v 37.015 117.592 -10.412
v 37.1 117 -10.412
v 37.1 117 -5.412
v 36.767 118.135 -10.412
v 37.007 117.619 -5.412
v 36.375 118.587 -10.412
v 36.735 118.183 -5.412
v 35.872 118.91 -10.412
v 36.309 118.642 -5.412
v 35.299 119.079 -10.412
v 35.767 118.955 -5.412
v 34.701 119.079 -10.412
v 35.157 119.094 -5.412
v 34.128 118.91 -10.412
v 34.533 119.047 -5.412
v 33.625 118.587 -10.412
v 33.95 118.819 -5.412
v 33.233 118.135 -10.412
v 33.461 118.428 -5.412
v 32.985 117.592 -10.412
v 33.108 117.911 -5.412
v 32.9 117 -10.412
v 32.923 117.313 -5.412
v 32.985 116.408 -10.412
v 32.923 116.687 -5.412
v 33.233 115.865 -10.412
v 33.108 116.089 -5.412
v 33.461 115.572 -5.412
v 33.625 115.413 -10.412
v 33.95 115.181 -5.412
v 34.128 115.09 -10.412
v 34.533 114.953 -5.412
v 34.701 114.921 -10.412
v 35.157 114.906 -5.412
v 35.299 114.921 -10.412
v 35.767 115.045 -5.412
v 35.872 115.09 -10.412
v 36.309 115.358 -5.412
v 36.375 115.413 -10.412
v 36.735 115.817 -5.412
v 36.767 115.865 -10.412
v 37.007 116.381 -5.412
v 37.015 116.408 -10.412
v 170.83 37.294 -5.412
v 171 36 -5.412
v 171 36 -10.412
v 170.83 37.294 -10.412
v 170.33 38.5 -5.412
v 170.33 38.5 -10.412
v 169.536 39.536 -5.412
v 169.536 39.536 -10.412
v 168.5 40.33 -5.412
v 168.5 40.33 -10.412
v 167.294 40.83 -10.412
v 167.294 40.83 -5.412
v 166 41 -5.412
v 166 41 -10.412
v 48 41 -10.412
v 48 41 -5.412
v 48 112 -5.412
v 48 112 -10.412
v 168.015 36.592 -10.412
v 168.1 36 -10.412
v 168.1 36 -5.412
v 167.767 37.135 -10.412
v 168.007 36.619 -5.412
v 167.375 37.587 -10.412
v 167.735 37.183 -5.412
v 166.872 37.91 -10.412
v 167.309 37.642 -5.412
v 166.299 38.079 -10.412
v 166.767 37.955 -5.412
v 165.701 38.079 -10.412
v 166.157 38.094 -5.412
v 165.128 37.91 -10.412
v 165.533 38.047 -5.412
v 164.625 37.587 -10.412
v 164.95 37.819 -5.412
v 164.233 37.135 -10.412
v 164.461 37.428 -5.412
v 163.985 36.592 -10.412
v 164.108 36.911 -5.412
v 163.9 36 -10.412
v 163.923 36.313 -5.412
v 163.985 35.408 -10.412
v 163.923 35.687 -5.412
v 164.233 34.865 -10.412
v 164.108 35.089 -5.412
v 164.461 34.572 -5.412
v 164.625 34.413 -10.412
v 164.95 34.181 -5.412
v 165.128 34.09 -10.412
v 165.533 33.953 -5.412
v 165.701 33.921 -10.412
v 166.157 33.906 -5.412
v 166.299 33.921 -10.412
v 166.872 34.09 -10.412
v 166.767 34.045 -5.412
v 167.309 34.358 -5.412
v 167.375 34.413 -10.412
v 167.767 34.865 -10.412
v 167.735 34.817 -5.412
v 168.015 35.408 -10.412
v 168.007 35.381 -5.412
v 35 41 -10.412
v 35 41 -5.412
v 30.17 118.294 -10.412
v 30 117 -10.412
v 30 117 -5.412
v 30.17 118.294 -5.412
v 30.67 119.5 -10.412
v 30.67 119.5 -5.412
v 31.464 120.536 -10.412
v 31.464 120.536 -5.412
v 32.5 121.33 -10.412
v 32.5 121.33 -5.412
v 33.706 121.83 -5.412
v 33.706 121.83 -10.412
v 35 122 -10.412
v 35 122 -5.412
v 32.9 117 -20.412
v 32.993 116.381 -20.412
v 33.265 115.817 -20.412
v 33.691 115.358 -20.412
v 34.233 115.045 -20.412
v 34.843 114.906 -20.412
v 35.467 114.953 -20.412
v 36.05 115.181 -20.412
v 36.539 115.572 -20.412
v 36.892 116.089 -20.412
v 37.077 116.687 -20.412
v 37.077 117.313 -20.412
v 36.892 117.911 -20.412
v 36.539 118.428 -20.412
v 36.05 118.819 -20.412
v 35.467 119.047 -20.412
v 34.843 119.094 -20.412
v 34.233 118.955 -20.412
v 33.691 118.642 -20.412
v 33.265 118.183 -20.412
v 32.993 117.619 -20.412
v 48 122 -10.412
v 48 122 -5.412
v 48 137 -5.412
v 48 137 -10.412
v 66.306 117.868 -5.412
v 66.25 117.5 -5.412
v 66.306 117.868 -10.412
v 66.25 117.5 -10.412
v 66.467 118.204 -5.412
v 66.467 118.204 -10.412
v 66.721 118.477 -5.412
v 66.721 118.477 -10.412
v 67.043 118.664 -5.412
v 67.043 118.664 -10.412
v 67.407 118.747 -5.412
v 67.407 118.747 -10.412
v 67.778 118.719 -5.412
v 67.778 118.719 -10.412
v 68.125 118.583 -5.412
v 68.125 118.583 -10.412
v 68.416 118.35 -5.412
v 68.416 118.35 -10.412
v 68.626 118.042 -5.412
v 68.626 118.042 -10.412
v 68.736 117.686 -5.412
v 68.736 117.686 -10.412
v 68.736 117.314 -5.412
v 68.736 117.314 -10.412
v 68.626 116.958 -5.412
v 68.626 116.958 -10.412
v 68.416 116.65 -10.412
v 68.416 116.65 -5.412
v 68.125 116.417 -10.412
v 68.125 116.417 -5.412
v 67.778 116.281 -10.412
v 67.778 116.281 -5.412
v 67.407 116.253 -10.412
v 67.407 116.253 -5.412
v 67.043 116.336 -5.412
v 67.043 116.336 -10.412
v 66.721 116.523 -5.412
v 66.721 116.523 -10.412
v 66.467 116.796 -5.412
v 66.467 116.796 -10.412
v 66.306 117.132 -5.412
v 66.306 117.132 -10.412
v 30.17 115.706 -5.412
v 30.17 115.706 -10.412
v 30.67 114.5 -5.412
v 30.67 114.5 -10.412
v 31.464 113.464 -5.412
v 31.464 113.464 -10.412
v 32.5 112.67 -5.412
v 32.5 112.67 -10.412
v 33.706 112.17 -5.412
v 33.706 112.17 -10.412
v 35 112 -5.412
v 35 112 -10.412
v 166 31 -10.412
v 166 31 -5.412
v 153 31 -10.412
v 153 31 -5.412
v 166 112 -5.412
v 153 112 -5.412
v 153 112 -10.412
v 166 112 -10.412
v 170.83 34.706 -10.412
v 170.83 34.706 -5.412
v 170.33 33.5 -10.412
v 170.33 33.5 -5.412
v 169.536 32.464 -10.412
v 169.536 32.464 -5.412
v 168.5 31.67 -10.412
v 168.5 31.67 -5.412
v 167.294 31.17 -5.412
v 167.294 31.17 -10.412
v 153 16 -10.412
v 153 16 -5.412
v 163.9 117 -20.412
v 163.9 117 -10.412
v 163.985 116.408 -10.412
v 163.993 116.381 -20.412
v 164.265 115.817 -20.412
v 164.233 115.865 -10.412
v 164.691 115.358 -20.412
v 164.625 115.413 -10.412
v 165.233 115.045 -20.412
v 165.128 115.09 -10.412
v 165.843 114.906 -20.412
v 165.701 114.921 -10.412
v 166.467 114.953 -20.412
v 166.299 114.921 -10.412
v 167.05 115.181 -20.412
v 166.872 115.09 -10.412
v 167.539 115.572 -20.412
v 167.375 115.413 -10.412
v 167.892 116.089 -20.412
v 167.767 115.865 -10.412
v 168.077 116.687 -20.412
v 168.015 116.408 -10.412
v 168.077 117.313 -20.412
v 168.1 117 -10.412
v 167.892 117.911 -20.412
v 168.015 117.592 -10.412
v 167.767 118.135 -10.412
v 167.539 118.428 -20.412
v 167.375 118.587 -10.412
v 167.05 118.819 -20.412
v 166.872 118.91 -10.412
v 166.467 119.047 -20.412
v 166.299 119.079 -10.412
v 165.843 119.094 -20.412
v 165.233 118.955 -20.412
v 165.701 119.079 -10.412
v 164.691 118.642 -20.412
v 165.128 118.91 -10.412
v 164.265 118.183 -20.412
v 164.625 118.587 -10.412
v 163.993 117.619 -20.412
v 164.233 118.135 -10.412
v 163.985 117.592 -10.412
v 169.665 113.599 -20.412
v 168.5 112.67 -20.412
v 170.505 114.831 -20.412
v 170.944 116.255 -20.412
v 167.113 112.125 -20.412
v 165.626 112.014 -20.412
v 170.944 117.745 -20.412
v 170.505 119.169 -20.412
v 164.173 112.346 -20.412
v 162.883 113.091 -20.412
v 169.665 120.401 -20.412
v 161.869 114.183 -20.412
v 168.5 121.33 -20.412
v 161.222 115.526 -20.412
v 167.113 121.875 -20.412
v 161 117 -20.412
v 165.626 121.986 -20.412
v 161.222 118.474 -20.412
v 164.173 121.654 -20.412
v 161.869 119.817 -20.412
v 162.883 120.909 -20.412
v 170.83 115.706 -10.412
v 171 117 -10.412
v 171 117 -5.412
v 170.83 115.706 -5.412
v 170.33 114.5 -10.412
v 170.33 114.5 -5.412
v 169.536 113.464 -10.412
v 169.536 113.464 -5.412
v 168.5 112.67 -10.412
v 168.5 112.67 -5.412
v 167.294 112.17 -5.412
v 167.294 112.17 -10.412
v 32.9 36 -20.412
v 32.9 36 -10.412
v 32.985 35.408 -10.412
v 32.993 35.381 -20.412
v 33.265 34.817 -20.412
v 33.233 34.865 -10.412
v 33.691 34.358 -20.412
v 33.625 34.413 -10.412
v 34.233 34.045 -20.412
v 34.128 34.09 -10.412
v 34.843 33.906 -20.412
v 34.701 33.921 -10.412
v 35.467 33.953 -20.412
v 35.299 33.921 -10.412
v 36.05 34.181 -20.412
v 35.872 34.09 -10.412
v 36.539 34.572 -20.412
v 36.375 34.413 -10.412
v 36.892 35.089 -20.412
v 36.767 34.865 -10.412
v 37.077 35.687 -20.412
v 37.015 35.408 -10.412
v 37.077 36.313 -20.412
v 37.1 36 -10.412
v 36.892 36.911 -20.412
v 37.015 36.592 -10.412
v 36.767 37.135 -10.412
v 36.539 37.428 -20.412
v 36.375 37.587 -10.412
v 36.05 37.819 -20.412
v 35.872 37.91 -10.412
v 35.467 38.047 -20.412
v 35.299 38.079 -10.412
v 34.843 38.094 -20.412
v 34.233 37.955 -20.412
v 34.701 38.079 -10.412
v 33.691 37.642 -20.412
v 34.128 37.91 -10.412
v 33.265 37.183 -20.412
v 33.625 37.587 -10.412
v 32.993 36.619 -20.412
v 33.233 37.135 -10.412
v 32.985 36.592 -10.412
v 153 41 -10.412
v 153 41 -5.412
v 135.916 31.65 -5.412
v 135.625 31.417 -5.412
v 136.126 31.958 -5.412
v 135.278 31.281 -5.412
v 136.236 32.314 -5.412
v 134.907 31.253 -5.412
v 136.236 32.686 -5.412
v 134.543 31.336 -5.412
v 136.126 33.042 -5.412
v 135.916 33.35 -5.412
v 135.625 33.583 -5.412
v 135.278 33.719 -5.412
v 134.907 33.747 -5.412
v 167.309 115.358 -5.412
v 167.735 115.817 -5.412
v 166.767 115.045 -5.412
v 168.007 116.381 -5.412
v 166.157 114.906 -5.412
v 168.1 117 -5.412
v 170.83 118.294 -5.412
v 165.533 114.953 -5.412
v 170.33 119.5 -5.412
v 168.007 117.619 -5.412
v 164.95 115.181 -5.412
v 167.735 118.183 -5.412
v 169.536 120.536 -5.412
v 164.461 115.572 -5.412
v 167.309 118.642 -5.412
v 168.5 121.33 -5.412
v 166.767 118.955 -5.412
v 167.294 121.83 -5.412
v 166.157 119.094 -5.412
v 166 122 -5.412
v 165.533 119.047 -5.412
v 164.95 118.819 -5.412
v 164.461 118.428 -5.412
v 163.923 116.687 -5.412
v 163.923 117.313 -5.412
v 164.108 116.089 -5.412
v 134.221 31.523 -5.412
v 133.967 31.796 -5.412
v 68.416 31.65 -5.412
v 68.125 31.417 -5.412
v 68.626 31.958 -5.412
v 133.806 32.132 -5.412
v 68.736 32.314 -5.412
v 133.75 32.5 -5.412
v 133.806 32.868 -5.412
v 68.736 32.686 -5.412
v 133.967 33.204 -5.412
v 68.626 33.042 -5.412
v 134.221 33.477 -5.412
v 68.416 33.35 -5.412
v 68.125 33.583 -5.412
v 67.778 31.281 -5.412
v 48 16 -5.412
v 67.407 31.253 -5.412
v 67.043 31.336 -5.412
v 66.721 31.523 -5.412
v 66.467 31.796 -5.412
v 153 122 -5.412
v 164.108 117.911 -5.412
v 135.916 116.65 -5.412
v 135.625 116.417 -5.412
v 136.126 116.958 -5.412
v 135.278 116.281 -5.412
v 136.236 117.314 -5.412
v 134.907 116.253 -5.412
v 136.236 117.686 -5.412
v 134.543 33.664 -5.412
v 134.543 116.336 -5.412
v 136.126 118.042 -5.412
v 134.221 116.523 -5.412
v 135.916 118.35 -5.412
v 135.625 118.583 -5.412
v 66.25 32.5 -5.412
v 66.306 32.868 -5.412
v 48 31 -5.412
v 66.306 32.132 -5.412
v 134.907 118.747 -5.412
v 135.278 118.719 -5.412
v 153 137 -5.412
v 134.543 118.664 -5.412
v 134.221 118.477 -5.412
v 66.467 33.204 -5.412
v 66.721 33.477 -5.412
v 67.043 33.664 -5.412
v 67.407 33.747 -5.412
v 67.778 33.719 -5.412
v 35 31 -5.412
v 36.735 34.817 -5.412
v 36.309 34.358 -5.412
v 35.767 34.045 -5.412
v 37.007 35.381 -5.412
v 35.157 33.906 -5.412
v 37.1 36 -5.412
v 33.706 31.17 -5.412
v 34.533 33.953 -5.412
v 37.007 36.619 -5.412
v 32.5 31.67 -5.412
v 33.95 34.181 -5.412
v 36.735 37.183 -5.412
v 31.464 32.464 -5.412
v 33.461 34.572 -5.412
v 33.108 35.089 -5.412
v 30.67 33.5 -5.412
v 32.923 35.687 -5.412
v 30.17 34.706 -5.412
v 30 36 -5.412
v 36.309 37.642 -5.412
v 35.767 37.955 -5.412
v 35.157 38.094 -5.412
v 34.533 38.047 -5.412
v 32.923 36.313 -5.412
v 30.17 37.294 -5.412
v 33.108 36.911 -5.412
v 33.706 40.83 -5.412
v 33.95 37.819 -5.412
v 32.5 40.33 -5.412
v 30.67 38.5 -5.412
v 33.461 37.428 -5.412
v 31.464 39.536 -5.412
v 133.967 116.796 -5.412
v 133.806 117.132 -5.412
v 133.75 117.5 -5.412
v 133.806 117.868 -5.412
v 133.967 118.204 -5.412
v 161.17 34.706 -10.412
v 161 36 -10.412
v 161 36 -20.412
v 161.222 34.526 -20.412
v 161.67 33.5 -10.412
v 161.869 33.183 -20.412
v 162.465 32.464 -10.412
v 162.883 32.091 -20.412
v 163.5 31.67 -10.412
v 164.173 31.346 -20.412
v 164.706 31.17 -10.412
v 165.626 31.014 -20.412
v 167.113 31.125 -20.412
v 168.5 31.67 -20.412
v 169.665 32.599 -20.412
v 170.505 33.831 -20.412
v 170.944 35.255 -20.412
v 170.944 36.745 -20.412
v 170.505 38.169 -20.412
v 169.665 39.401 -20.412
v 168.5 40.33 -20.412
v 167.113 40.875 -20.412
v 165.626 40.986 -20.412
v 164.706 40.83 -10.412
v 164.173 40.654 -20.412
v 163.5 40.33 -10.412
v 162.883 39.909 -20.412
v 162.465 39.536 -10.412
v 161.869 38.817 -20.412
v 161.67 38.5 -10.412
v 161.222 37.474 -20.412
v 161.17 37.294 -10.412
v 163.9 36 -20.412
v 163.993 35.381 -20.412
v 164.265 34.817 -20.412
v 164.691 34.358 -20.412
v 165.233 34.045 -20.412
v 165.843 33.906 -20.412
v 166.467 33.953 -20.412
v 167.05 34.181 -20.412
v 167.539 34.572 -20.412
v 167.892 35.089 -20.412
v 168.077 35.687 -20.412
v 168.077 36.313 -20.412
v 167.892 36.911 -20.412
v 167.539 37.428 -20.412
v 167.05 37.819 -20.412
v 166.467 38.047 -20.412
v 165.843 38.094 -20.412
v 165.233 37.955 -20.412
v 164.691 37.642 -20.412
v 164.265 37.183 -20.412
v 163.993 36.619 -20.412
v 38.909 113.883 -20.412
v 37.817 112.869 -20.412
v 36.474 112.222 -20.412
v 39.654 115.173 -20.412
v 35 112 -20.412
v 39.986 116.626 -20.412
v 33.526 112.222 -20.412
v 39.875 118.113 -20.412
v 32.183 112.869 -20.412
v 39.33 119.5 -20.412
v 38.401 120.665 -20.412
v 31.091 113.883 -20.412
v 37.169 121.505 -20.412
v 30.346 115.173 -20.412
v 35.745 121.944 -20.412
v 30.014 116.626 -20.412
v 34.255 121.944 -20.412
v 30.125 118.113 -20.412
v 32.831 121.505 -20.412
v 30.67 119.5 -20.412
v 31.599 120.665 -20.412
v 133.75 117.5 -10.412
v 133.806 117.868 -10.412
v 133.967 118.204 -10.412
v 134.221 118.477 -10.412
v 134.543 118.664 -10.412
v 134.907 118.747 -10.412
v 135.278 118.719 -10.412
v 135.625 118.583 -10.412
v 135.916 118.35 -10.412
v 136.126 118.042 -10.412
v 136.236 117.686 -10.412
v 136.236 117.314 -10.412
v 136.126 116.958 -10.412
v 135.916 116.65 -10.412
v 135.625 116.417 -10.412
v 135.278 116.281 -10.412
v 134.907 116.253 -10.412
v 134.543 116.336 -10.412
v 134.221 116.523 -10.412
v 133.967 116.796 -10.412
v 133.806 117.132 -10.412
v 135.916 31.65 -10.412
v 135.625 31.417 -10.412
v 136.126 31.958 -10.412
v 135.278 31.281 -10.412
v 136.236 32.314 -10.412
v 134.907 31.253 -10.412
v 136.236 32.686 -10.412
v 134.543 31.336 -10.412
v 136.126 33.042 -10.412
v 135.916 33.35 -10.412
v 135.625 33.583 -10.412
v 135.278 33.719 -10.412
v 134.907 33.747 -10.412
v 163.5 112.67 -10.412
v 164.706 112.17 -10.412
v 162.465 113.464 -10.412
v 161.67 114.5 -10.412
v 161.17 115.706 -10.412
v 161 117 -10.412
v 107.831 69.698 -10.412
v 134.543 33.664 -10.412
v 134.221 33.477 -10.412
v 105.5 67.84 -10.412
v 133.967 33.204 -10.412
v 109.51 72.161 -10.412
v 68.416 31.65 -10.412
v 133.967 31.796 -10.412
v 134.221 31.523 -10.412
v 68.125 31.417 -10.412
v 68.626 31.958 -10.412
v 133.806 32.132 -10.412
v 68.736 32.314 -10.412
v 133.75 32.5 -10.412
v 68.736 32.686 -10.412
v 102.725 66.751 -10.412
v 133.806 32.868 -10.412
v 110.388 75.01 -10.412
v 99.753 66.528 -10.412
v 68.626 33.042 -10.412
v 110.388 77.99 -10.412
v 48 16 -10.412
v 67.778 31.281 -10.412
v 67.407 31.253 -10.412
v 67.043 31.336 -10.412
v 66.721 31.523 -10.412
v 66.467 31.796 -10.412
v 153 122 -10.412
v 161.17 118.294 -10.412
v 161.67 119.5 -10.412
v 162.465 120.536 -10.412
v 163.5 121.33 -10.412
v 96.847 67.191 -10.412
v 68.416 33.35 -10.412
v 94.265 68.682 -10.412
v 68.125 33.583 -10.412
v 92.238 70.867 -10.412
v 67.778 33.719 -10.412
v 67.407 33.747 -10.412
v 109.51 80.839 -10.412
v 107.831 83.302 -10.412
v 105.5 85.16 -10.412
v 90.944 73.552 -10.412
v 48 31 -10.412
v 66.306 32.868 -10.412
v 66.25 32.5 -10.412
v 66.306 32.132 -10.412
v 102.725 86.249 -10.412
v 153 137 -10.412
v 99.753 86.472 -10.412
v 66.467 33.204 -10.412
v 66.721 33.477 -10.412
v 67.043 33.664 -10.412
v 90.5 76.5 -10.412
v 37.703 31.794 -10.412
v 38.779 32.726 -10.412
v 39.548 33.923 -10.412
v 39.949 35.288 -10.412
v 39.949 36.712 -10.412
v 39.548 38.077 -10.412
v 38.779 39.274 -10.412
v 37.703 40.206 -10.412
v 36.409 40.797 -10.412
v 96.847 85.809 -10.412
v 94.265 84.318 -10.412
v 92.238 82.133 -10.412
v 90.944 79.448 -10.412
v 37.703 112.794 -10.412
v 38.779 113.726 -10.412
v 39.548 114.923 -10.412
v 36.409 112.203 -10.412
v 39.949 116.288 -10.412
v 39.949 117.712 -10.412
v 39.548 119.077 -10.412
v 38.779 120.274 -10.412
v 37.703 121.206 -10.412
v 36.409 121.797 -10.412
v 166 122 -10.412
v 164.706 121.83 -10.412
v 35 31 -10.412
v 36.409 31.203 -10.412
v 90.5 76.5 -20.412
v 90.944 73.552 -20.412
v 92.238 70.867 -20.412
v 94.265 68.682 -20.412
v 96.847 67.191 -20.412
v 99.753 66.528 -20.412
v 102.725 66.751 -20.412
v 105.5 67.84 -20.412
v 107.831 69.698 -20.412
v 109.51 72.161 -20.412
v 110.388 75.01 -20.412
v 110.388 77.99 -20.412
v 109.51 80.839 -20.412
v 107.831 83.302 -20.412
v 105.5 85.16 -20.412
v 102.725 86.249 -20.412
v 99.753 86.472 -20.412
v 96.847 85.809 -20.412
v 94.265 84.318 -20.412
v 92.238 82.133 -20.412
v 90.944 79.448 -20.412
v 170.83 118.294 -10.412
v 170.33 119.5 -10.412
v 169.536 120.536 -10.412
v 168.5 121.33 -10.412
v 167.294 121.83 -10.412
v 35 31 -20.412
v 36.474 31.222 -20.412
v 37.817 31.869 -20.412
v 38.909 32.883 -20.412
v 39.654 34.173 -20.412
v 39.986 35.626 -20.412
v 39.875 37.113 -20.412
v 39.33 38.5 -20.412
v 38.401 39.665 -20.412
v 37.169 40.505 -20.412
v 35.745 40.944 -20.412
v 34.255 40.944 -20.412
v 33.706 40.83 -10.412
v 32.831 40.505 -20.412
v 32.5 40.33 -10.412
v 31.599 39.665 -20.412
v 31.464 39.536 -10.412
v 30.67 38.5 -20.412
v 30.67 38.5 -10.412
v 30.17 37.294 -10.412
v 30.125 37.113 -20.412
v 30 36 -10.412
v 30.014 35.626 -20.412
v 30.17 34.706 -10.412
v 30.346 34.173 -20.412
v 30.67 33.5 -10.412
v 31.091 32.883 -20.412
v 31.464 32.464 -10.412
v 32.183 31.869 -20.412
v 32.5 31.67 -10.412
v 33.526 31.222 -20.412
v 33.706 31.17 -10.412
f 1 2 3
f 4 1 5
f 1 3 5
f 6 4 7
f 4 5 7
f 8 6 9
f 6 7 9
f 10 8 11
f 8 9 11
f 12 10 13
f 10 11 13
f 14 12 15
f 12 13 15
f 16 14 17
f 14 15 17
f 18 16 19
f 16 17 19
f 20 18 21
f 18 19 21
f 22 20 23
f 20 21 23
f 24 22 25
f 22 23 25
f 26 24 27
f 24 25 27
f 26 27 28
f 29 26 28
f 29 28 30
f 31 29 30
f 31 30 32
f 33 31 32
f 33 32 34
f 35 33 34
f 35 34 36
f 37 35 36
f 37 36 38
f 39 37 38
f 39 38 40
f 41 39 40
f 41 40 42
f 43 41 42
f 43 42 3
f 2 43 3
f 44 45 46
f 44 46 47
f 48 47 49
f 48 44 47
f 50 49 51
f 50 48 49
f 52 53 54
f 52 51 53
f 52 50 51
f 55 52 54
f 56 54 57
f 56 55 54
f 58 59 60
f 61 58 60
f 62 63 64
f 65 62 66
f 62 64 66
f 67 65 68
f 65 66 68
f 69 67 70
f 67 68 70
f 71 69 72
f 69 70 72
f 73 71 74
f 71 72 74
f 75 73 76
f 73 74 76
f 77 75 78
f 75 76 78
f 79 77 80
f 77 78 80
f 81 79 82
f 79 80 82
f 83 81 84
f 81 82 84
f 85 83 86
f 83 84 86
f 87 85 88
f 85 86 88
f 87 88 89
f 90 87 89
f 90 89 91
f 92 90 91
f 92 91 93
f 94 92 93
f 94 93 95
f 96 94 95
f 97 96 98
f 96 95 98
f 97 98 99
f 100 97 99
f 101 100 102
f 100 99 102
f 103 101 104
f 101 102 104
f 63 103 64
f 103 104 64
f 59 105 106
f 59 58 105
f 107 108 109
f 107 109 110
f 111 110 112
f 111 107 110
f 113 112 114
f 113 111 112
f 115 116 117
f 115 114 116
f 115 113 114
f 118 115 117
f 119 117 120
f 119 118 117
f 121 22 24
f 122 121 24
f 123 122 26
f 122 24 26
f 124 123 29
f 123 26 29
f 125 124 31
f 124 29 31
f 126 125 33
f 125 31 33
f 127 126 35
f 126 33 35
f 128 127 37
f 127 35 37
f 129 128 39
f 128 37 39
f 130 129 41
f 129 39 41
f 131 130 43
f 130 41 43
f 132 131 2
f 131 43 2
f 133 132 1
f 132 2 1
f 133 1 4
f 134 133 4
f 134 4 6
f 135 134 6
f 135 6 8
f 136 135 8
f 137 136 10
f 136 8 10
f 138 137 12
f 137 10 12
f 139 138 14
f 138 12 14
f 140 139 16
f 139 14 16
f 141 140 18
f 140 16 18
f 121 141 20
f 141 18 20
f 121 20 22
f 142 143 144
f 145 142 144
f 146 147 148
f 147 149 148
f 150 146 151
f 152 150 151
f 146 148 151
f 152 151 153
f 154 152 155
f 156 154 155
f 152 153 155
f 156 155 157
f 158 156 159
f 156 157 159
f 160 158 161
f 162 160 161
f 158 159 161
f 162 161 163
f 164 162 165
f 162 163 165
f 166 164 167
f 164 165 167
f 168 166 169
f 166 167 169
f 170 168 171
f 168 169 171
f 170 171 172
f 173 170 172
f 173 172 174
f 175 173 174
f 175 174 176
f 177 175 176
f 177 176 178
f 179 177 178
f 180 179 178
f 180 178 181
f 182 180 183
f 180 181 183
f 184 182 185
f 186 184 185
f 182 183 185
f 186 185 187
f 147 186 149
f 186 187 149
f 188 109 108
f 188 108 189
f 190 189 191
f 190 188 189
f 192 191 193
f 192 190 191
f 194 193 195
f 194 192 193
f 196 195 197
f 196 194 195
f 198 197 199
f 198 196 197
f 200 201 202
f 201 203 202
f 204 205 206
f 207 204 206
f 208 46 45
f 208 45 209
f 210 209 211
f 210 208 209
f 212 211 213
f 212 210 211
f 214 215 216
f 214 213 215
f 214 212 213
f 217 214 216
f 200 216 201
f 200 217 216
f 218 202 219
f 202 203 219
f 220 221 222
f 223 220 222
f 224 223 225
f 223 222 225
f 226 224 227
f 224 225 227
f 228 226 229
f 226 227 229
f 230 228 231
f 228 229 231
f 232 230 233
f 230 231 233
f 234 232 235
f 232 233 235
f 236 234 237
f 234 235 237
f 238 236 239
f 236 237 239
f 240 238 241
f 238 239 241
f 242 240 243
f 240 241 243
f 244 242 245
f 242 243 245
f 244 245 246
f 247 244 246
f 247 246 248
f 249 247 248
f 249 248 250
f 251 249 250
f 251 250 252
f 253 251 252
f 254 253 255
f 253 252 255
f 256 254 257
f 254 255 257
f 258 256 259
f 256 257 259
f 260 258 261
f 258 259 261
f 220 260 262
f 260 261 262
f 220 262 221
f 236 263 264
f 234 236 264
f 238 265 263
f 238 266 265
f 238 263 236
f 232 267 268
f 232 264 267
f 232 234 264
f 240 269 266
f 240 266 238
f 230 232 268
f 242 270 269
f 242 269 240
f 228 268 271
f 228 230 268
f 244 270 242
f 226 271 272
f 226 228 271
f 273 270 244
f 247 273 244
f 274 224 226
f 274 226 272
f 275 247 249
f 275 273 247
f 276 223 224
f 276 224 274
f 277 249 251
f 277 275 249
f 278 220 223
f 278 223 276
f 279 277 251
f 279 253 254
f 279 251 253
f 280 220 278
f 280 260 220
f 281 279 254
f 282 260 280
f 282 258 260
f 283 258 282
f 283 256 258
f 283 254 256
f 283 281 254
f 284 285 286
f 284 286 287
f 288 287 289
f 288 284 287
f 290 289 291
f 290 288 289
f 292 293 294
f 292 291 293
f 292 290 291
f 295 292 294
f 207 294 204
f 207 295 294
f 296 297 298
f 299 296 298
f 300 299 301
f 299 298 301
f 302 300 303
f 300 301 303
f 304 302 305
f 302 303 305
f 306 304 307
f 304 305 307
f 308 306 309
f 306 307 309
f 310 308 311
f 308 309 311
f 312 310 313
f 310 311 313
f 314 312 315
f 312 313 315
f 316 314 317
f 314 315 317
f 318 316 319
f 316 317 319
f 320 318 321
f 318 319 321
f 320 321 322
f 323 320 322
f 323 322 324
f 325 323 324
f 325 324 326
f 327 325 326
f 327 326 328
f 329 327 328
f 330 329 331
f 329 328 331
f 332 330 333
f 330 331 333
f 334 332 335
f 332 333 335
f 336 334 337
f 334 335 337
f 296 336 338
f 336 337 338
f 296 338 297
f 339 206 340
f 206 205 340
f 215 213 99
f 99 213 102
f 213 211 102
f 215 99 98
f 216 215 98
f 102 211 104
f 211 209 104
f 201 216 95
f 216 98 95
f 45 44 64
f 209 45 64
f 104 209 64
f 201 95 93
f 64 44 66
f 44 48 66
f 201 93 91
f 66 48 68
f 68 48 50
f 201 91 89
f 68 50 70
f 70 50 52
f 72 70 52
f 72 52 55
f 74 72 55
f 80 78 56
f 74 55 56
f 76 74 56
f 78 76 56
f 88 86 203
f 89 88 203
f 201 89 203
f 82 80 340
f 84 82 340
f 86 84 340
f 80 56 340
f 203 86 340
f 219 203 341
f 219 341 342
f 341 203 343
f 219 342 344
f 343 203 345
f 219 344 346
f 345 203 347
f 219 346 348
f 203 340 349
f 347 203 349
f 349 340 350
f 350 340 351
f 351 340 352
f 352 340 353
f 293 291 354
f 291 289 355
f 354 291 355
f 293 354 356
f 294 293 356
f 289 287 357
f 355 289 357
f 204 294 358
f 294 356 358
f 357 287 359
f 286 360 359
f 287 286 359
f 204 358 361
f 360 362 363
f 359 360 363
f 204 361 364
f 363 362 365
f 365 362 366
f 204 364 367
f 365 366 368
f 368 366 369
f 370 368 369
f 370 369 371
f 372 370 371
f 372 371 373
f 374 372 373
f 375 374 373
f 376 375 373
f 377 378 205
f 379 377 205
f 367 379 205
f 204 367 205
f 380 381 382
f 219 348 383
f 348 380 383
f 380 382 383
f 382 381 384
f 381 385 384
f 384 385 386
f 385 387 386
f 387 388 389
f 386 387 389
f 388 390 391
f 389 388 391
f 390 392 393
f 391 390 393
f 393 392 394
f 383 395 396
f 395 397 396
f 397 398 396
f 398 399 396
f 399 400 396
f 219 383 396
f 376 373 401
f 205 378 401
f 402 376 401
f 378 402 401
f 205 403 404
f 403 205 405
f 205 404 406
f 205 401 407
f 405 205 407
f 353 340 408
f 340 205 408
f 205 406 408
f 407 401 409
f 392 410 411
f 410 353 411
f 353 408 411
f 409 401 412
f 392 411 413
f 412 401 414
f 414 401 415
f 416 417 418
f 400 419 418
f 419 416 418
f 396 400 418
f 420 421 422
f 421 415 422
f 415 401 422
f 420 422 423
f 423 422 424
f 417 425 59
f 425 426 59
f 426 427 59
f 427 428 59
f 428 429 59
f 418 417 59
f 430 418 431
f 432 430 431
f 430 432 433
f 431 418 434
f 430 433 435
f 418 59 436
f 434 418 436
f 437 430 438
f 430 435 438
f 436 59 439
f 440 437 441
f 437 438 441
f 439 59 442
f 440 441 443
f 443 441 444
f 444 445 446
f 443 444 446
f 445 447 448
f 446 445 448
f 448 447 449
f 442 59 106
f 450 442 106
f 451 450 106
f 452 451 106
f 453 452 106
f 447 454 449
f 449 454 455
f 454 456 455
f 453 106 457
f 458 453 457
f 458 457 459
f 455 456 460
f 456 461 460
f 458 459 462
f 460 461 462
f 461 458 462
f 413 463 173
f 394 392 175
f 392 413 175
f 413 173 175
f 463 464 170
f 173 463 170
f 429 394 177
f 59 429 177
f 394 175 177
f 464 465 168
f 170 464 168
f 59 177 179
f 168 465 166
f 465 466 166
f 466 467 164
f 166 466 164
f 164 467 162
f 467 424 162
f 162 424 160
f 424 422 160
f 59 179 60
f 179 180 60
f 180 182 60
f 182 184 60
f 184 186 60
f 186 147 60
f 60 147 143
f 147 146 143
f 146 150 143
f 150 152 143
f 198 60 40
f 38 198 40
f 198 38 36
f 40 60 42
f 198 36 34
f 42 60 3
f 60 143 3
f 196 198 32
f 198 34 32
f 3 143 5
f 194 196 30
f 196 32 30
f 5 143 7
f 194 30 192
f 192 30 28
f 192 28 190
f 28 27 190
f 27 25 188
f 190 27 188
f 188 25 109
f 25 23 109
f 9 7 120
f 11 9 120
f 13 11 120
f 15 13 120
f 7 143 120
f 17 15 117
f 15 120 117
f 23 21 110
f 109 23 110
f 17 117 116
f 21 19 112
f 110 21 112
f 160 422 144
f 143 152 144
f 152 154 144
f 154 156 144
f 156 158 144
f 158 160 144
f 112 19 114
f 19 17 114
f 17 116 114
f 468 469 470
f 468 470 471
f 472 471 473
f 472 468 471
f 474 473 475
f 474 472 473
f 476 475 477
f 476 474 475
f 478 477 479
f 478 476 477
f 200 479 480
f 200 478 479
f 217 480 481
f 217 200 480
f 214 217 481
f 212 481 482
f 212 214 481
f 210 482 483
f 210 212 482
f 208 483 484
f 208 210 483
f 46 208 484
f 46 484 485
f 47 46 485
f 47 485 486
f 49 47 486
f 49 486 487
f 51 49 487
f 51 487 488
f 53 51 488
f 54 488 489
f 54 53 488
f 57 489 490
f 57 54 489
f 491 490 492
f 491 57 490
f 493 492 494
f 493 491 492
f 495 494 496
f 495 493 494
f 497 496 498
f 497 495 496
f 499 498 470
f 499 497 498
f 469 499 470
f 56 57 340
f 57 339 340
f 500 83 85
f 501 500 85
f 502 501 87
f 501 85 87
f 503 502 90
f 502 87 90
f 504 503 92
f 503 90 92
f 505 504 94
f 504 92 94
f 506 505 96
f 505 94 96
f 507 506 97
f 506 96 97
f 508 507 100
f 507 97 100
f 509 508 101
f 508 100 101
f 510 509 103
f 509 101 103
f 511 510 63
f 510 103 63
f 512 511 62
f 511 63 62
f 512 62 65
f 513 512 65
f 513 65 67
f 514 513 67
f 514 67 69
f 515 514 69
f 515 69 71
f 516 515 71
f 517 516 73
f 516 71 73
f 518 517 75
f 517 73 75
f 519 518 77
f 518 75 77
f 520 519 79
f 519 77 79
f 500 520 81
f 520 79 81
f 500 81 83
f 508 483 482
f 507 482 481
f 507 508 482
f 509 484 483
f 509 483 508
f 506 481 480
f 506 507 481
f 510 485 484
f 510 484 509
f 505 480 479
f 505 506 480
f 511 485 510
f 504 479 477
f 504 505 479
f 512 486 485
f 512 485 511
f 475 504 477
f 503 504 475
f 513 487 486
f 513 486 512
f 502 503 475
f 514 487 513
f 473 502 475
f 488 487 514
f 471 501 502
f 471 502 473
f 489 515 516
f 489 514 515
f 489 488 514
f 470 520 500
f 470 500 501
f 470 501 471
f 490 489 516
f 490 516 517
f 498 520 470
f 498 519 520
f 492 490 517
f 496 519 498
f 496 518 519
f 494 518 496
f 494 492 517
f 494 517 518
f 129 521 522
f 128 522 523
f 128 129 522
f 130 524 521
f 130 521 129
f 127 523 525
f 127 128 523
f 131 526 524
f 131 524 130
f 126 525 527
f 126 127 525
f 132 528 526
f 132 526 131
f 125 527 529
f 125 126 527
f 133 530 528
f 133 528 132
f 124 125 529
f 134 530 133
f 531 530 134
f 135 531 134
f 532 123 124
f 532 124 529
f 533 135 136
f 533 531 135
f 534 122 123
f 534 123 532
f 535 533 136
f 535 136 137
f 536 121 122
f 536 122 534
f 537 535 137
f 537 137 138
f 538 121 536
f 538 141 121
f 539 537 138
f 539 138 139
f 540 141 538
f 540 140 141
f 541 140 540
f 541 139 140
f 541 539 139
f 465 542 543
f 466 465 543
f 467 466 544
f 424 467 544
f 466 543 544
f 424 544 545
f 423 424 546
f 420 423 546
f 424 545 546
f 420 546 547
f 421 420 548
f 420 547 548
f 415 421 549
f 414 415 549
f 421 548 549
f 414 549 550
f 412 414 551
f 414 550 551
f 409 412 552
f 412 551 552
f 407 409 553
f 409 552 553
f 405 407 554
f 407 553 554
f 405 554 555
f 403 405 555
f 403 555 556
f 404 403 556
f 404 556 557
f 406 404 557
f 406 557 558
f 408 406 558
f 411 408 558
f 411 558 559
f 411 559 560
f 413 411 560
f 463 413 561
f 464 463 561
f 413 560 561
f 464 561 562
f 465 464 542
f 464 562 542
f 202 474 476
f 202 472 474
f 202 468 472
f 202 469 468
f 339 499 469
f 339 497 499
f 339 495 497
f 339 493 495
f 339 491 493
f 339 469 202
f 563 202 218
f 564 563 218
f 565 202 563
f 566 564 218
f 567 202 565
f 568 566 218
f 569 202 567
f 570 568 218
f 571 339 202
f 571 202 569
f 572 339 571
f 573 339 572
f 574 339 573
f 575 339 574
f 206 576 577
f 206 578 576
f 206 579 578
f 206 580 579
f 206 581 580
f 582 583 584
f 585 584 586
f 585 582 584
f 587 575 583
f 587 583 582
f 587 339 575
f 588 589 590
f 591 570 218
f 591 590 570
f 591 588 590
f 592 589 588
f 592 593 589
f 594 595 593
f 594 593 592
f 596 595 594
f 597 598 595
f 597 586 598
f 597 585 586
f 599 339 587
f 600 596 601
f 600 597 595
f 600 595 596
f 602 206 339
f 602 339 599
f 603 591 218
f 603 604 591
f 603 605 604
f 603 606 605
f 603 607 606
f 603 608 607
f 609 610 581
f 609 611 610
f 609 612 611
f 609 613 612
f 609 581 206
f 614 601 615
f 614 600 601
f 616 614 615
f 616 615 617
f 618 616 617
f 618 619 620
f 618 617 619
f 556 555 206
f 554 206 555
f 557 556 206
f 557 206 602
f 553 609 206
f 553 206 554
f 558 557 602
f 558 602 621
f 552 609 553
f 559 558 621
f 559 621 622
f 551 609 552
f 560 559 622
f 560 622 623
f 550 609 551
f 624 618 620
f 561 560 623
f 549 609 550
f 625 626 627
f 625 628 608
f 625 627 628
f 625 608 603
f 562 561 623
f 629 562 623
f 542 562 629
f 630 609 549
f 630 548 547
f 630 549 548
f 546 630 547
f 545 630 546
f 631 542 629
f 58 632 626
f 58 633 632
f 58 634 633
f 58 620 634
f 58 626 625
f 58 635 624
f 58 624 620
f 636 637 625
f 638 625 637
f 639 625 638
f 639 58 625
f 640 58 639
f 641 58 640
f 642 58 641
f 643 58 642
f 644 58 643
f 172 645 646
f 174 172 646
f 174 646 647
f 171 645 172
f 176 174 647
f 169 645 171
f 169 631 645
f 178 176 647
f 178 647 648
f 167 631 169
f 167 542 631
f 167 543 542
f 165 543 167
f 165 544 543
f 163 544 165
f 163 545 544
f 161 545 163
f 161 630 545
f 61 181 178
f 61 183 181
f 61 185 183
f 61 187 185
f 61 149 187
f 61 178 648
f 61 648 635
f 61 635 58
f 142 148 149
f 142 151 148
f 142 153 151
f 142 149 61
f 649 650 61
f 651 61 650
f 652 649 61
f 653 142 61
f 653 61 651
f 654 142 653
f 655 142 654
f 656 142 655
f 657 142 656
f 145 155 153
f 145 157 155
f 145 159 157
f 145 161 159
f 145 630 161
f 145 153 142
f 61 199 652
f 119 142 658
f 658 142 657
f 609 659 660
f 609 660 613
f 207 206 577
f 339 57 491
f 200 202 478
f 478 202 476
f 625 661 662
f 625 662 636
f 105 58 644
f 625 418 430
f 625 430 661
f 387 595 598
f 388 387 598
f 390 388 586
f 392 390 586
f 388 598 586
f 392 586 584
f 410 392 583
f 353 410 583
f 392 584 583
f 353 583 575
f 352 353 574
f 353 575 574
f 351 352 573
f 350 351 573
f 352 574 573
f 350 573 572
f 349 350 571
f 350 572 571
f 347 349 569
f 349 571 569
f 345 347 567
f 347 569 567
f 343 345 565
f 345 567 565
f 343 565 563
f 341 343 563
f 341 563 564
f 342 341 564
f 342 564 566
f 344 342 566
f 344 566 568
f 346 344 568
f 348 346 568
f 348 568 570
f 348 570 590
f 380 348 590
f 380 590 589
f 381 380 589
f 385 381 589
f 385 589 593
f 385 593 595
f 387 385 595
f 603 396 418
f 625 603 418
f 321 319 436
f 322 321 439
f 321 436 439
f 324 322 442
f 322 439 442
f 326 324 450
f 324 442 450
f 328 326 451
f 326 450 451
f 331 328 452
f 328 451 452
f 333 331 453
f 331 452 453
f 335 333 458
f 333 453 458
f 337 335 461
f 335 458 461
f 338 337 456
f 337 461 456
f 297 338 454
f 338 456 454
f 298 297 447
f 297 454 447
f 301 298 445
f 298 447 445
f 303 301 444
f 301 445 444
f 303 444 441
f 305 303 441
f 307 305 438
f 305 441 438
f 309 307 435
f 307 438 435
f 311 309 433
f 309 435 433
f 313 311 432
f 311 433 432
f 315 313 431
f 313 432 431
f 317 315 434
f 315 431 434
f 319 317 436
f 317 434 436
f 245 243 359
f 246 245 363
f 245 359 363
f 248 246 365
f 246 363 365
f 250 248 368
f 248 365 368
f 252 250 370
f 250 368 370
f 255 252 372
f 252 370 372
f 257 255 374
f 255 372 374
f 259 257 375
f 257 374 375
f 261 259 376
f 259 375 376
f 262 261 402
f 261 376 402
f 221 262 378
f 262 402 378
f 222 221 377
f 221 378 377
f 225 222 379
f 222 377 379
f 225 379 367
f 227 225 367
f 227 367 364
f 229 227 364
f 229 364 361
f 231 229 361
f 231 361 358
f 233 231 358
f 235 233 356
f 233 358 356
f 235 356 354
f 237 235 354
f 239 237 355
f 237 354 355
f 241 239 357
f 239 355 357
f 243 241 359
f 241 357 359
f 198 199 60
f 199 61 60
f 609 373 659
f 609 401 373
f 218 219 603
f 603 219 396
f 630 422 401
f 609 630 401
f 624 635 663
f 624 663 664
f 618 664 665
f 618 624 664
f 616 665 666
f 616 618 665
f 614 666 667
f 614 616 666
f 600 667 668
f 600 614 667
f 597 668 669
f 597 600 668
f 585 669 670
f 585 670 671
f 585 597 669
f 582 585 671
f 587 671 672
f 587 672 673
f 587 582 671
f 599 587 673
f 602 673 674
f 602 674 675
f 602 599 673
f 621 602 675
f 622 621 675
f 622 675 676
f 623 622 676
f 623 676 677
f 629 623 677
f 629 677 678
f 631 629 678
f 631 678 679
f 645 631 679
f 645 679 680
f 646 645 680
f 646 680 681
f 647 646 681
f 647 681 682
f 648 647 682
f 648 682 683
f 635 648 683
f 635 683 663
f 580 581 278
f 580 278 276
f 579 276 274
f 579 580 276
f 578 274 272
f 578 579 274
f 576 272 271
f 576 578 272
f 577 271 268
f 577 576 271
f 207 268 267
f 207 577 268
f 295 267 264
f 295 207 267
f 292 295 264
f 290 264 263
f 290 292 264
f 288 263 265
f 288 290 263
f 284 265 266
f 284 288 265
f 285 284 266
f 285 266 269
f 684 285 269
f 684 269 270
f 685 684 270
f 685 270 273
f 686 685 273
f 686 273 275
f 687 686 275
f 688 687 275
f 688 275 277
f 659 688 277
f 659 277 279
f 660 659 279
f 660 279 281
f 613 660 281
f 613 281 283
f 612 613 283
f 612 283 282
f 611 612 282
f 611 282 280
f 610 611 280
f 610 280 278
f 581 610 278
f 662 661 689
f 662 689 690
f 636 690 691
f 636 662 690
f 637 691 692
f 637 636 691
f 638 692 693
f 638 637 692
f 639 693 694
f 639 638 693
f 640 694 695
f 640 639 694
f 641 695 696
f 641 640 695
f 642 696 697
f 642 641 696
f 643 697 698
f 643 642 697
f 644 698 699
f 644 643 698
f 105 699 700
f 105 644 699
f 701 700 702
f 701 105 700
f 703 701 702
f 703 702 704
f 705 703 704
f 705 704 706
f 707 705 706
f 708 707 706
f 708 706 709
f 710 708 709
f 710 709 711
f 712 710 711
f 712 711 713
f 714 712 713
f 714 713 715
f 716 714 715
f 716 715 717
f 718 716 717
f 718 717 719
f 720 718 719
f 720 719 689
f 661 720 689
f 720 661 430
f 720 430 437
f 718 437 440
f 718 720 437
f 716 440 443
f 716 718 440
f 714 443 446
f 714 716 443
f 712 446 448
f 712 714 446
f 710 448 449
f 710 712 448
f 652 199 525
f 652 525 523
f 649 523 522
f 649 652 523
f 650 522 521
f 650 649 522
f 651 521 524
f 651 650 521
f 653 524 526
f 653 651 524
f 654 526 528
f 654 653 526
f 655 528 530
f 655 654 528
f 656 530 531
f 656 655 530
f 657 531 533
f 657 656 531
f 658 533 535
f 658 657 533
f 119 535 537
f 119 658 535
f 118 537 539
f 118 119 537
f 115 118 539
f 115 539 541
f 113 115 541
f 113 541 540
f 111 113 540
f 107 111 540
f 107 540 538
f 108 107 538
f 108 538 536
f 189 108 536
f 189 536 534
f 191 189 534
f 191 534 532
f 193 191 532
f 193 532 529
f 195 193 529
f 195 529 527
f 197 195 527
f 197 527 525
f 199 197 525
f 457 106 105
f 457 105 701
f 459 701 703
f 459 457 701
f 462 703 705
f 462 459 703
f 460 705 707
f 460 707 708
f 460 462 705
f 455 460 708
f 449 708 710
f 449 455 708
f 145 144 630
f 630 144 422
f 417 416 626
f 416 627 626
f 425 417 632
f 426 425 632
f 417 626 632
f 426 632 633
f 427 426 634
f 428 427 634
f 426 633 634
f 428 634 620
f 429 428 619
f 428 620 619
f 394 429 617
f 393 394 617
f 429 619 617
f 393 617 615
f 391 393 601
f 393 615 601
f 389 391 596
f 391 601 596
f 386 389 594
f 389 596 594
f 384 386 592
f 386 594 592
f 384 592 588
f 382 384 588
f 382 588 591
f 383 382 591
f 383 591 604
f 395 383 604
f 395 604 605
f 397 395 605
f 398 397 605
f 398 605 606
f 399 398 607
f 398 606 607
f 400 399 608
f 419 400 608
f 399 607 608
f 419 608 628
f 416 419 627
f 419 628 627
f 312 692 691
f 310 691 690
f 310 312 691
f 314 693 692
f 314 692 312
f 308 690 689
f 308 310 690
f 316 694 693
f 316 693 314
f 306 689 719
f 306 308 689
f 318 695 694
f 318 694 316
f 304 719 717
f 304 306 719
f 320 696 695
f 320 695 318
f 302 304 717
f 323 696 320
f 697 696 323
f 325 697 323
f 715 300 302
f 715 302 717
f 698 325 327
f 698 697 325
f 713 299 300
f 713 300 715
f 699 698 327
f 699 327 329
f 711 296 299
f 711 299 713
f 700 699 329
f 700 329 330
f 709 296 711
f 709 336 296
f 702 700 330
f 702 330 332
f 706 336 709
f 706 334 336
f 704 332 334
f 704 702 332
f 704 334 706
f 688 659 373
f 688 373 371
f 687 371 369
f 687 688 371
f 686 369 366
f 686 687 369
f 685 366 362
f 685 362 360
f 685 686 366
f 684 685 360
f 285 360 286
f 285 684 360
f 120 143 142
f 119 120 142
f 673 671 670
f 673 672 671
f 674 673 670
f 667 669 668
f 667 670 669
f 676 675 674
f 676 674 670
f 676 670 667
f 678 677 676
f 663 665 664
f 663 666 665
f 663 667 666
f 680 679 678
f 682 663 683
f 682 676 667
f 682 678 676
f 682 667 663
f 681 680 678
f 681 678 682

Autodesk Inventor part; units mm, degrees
ref_plane "YZ Plane" through (0, 0, 0) normal (1, 0, 0) x (0, 1, 0)
ref_plane "XZ Plane" through (0, 0, 0) normal (0, 1, 0) x (-1, 0, 0)
ref_plane "XY Plane" through (0, 0, 0) normal (0, 0, 1) x (1, 0, 0)
ref_plane "Arbeitsebene1" through (145, 129, -5.4115) normal (0, 0, -1) x (-1, 0, 0)
sketch "Skizze1" plane through (145, 129, -5.4115) normal (0, 0, -1) x (-1, 0, 0)
  line L0 (0, -105) -> (89, -105) projected
  line L1 (89, -105) -> (89, 0) projected
  line L2 (0, 0) -> (0, -105) projected
  line L3 (89, 0) -> (0, 0) projected
  line L4 (89, -105) -> (0, 0)
  line L5 (0, -105) -> (89, 0)
  line L6 (97, 8) -> (-8, 8)
  line L7 (-8, 8) -> (-8, -113)
  line L8 (-8, -113) -> (97, -113)
  line L9 (97, -113) -> (97, 8)
  line L10 (97, 8) -> (-8, -113) construction
  line L11 (-8, 8) -> (97, -113) construction
  point P0 (145, -129)
  point P1 (44.5, -52.5)
  dimension "d1" = 105
  dimension "d2" = 121
extrude "Extrusion1" add sketch "Skizze1" along normal blind 5 contours L5 L4 L0 | L2 L4 L5 | L4 L5 L1 | L3 L5 L4 | L9 L8 L7 L6
sketch "Skizze3" plane through (145, 129, -10.4115) normal (0, 0, -1) x (-1, 0, 0)
  circle A0 centre (10, -96.5) radius 1 projected
  circle A1 centre (10, -11.5) radius 1 projected
  circle A2 centre (77.5, -96.5) radius 1 projected
  circle A3 centre (77.5, -11.5) radius 1 projected
  circle A4 centre (77.5, -11.5) radius 4 projected
  circle A5 centre (77.5, -11.5) radius 1.25
  circle A6 centre (77.5, -96.5) radius 4 projected
  circle A7 centre (77.5, -96.5) radius 1.25
  circle A8 centre (10, -96.5) radius 1.25
  circle A9 centre (10, -11.5) radius 1.25
  point P0 (145, -129)
  dimension "d12" = 2.5
  dimension "d13" = 2.5
  dimension "d14" = 2.5
  dimension "d15" = 2.5
extrude "Extrusion3" cut sketch "Skizze3" against normal blind 25.25 contours A0 | A1 | A2 | A3 | A5 | A7 | A8 | A9
sketch "Skizze5" plane through (48, 16, -5.4115) normal (-1, 0, 0) x (0, 0, 1)
  line L0 (0, 0) -> (0, 121) projected
  line L1 (0, 121) -> (-5, 121) projected
  line L2 (-5, 0) -> (-5, 121) projected
  line L3 (0, 0) -> (-5, 0) projected
  line L4 (0, 121) -> (0, 106)
  line L5 (0, 0) -> (0, 15)
  line L6 (0, 106) -> (-5, 106)
  line L7 (-5, 106) -> (-5, 96)
  line L8 (-5, 96) -> (0, 96)
  line L9 (0, 96) -> (0, 106)
  line L10 (0, 15) -> (-5, 15)
  line L11 (-5, 15) -> (-5, 25)
  line L12 (-5, 25) -> (0, 25)
  line L13 (0, 25) -> (0, 15)
  point P0 (5.4115, -16)
  dimension "d24" = 15
  dimension "d25" = 15
  dimension "d26" = 10
  dimension "d27" = 10
extrude "Extrusion5" add sketch "Skizze5" along normal blind 18 contours L10 L2 L12 L0 | L8 L2 L6 L0
fillet "Rundung1" radius 5 4 edges at (30, 122, -7.9115) (30, 112, -7.9115) (30, 41, -7.9115) (30, 31, -7.9115)
sketch "Skizze6" plane through (153, 16, -5.4115) normal (1, 0, 0) x (0, 0, -1)
  line L0 (0, 121) -> (0, 0) projected
  line L1 (0, 0) -> (5, 0) projected
  line L2 (5, 121) -> (5, 0) projected
  line L3 (0, 121) -> (5, 121) projected
  line L4 (0, 0) -> (0, 15) projected
  line L5 (0, 0) -> (0, 15)
  line L6 (0, 121) -> (0, 106)
  line L7 (0, 15) -> (5, 15)
  line L8 (5, 15) -> (5, 25)
  line L9 (5, 25) -> (0, 25)
  line L10 (0, 25) -> (0, 15)
  line L11 (0, 96) -> (5, 96) projected
  line L12 (0, 106) -> (5, 106)
  line L13 (5, 106) -> (5, 96)
  line L14 (5, 96) -> (0, 96)
  line L15 (0, 96) -> (0, 106)
  point P0 (-5.4115, -16)
  dimension "d31" = 15
  dimension "d32" = 15
  dimension "d33" = 10
  dimension "d34" = 10
extrude "Extrusion6" add sketch "Skizze6" along normal blind 18 contours L12 L2 L11 L0 | L9 L2 L7 L0
fillet "Rundung2" radius 5 4 edges at (171, 112, -7.9115) (171, 122, -7.9115) (171, 31, -7.9115) (171, 41, -7.9115)
sketch "Skizze7" plane through (145, 129, -5.4115) normal (0, 0, 1) x (1, 0, 0)
  arc A0 (21, -98) -> (21, -88) centre (21, -93) ccw projected
  line L0 (8, -88) -> (21, -88) projected
  line L1 (8, -17) -> (8, -88) projected
  line L2 (8, -17) -> (21, -17) projected
  arc A1 (21, -17) -> (21, -7) centre (21, -12) ccw projected
  line L3 (8, -7) -> (21, -7) projected
  line L4 (8, 8) -> (8, -7) projected
  line L5 (-97, 8) -> (8, 8) projected
  line L6 (-97, -7) -> (-97, 8) projected
  line L7 (-97, -7) -> (-110, -7) projected
  arc A2 (-110, -7) -> (-110, -17) centre (-110, -12) ccw projected
  line L8 (-97, -17) -> (-110, -17) projected
  line L9 (-97, -88) -> (-97, -17) projected
  line L10 (-97, -88) -> (-110, -88) projected
  arc A3 (-110, -88) -> (-110, -98) centre (-110, -93) ccw projected
  line L11 (-97, -98) -> (-110, -98) projected
  line L12 (-97, -113) -> (-97, -98) projected
  line L13 (8, -113) -> (-97, -113) projected
  line L14 (8, -98) -> (8, -113) projected
  line L15 (8, -98) -> (21, -98) projected
  circle A4 centre (-110, -12) radius 2.1
  circle A5 centre (21, -12) radius 2.1
  circle A6 centre (21, -93) radius 2.1
  arc A7 (-110, -88) -> (-110, -98) centre (-110, -93) ccw projected
  circle A8 centre (-110, -93) radius 2.1
  point P0 (-145, -129)
  dimension "d38" = 4.2
  dimension "d39" = 4.2
  dimension "d40" = 4.2
  dimension "d41" = 4.2
extrude "Extrusion7" cut sketch "Skizze7" against normal blind 18 contours A4 | A5 | A6 | A8
sketch "Skizze8" plane through (145, 129, -10.4115) normal (0, 0, -1) x (-1, 0, 0)
  circle A0 centre (-21, -93) radius 2.1 projected
  circle A1 centre (-21, -12) radius 2.1 projected
  circle A2 centre (110, -93) radius 2.1 projected
  circle A3 centre (110, -12) radius 2.1 projected
  arc A4 (-21, -88) -> (-21, -98) centre (-21, -93) ccw projected
  line L0 (-8, -98) -> (-21, -98) projected
  line L1 (-8, -98) -> (-8, -113) projected
  line L2 (-8, -113) -> (97, -113) projected
  line L3 (97, -113) -> (97, -98) projected
  line L4 (97, -98) -> (110, -98) projected
  arc A5 (110, -98) -> (110, -88) centre (110, -93) ccw projected
  line L5 (97, -88) -> (110, -88) projected
  line L6 (97, -88) -> (97, -17) projected
  line L7 (97, -17) -> (110, -17) projected
  arc A6 (110, -17) -> (110, -7) centre (110, -12) ccw projected
  line L8 (97, -7) -> (110, -7) projected
  line L9 (97, -7) -> (97, 8) projected
  line L10 (97, 8) -> (-8, 8) projected
  line L11 (-8, 8) -> (-8, -7) projected
  line L12 (-8, -7) -> (-21, -7) projected
  arc A7 (-21, -7) -> (-21, -17) centre (-21, -12) ccw projected
  line L13 (-8, -17) -> (-21, -17) projected
  line L14 (-8, -17) -> (-8, -88) projected
  line L15 (-8, -88) -> (-21, -88) projected
  circle A8 centre (-21, -93) radius 5
  circle A9 centre (-21, -12) radius 5
  circle A10 centre (110, -12) radius 5
  circle A11 centre (110, -93) radius 5
  line L16 (97, -113) -> (-8, 8)
  circle A12 centre (44.5, -52.5) radius 10
  point P0 (145, -129)
  dimension "d44" = 20
extrude "Extrusion8" add sketch "Skizze8" along normal blind 10 contours A8 A4 | A7 A9 | A12 L16 | L16 A12 | A11 A5 | A6 A10
properties part number "PCB_Gehaeuse_o"
